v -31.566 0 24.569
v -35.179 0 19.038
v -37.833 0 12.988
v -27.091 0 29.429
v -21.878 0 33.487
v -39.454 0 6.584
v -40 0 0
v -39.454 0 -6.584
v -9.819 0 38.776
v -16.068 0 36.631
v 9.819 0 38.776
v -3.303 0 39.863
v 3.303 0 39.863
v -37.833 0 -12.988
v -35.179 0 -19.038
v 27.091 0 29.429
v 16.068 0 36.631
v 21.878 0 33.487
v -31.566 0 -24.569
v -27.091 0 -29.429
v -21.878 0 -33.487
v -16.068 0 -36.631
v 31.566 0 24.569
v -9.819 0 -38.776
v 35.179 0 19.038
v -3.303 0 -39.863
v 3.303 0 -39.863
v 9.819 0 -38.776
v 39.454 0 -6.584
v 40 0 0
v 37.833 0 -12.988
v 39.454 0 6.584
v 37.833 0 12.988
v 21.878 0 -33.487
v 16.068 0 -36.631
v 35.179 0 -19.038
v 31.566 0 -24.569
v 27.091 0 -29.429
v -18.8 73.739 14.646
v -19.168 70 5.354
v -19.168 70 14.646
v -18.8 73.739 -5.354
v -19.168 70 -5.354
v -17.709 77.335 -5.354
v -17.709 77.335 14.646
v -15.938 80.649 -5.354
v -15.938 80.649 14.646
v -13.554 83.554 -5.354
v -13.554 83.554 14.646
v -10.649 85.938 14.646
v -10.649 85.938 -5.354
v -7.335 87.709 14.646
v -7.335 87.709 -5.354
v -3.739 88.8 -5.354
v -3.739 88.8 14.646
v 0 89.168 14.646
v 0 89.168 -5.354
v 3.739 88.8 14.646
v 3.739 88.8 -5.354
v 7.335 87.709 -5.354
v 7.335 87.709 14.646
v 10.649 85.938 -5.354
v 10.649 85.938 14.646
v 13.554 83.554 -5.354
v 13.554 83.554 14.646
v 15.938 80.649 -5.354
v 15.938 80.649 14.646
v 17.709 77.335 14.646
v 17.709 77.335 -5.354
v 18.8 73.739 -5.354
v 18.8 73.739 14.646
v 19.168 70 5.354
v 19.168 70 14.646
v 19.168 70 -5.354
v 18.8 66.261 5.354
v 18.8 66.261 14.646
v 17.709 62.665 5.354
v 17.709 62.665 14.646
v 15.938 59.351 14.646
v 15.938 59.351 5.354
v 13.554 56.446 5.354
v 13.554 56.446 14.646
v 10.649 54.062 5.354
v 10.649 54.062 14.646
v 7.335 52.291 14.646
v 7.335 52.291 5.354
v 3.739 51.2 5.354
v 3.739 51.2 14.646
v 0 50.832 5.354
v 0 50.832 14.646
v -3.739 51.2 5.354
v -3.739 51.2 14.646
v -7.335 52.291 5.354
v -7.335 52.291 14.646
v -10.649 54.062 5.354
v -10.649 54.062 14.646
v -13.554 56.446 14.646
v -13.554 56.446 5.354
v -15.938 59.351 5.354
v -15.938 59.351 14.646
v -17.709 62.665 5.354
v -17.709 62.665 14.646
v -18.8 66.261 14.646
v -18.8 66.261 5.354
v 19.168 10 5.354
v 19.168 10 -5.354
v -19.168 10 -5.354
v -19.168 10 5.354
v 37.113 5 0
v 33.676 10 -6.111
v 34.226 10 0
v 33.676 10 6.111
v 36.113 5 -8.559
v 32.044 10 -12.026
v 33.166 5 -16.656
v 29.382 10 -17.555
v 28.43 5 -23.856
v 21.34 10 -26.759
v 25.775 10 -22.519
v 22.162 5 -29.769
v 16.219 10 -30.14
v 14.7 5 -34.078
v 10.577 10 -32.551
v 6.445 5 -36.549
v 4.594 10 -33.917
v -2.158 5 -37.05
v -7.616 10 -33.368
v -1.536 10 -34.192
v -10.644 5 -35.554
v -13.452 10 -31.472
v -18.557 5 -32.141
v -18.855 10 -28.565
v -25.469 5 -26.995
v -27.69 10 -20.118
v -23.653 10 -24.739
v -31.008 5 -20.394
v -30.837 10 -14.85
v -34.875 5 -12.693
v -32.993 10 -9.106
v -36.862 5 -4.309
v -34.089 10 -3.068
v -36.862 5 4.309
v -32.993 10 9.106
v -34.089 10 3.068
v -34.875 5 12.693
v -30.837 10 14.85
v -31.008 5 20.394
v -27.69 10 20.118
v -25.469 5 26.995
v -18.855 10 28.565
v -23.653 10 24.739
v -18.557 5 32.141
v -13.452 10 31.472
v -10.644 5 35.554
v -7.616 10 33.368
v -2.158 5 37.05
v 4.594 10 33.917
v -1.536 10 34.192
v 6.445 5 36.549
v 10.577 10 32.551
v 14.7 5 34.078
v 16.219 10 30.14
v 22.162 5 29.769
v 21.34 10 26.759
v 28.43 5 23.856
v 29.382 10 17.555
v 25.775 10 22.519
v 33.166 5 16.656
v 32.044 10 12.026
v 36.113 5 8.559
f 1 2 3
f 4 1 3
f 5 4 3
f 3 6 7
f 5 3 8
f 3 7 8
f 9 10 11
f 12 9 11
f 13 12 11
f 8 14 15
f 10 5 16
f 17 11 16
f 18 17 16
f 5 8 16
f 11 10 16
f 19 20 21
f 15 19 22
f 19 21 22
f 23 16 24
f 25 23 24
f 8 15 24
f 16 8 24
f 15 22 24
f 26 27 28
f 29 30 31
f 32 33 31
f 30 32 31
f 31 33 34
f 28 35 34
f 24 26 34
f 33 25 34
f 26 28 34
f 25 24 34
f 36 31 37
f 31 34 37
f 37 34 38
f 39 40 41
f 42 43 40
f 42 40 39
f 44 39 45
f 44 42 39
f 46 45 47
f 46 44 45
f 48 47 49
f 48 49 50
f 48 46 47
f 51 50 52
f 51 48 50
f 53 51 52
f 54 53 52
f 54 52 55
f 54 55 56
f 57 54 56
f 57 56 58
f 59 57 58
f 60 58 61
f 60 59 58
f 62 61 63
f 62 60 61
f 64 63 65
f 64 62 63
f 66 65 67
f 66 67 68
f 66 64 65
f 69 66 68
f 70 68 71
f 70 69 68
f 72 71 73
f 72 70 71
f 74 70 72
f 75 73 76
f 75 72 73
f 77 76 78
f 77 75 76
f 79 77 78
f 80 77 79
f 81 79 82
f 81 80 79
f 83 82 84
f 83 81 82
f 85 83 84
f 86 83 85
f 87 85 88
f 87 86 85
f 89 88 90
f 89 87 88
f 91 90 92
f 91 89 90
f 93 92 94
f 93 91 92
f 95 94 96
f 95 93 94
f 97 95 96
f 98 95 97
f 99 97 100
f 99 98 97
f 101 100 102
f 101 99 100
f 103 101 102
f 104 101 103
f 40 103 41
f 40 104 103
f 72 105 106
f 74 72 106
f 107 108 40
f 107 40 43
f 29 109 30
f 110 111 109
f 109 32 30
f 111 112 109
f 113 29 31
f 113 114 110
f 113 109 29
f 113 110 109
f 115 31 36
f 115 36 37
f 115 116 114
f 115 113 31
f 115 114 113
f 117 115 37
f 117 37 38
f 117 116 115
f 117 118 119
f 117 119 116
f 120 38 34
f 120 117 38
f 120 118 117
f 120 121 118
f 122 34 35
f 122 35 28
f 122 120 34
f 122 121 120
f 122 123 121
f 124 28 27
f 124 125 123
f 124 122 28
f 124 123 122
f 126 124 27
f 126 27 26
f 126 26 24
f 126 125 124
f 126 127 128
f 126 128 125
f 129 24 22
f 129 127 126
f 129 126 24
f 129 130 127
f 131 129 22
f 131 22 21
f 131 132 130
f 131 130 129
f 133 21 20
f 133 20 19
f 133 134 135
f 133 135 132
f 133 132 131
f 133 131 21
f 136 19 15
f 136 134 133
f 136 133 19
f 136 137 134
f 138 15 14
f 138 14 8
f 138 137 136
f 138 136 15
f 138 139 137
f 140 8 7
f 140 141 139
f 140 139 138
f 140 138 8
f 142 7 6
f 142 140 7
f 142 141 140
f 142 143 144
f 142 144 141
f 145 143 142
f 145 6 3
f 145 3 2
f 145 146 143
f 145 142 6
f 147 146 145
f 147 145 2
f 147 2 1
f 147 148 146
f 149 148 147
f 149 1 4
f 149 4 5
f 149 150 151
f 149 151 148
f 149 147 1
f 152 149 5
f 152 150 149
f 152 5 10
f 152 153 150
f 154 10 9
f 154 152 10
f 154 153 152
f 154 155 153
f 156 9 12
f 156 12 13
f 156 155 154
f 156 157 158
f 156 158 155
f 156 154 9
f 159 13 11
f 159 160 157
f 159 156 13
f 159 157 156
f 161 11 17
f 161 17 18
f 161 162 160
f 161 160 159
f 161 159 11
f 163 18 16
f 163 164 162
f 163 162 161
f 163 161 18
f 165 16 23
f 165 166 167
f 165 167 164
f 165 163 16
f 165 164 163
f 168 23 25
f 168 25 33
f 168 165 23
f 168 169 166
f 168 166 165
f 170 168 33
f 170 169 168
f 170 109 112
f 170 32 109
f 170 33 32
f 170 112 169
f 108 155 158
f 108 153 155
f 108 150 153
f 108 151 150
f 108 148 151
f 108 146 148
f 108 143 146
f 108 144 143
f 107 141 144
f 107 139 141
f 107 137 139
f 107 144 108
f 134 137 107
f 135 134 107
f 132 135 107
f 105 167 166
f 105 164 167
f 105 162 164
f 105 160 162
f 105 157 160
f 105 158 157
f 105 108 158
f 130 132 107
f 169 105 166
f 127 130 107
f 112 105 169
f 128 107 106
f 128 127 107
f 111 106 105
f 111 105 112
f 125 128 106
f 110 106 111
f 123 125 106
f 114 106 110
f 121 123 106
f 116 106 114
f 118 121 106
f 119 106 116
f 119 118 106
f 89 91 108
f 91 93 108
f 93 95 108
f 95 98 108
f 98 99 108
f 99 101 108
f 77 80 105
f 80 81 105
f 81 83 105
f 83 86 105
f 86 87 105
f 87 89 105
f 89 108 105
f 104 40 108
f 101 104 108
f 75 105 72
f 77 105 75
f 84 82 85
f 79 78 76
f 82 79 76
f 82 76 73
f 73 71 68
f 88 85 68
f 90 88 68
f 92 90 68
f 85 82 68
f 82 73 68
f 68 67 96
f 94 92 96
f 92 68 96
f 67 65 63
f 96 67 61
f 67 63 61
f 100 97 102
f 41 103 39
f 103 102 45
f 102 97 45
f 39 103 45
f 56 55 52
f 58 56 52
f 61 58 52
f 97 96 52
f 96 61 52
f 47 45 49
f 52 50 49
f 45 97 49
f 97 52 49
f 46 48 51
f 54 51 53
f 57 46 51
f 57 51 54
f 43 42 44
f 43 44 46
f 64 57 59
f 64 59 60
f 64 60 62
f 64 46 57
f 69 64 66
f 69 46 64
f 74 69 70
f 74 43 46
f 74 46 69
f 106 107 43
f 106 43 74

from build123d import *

# Parameters (mm, degrees)
SKETCH1_R           = 40
BOSS_EXTRUDE1_DEPTH = 10
BOSS_EXTRUDE1_TAPER = 30
SKETCH2_W           = 38.335841008
SKETCH2_H           = 10.708335478
BOSS_EXTRUDE2_DEPTH = 60
SKETCH3_R           = 19.167920504
BOSS_EXTRUDE3_DEPTH = 20


with BuildPart() as part:
    # Sketch1 → Boss-Extrude1 (new body)
    with BuildSketch(Plane(origin=(0, 0, 0), x_dir=(1, 0, 0), z_dir=(0, 1, 0))):
        Circle(SKETCH1_R)
    extrude(amount=BOSS_EXTRUDE1_DEPTH, taper=BOSS_EXTRUDE1_TAPER)

    # Sketch2 → Boss-Extrude2 (add)
    with BuildSketch(Plane(origin=(0, 10, 0), x_dir=(1, 0, 0), z_dir=(0, 1, 0))):
        Rectangle(SKETCH2_W, SKETCH2_H)
    extrude(amount=BOSS_EXTRUDE2_DEPTH)

    # Sketch3 → Boss-Extrude3 (add)
    with BuildSketch(Plane(origin=(0, 0, -5.354167739), x_dir=(-1, 0, 0), z_dir=(0, 0, -1))):
        with Locations((0, 70)):
            Circle(SKETCH3_R)
    extrude(amount=-BOSS_EXTRUDE3_DEPTH)


solid = part.part
